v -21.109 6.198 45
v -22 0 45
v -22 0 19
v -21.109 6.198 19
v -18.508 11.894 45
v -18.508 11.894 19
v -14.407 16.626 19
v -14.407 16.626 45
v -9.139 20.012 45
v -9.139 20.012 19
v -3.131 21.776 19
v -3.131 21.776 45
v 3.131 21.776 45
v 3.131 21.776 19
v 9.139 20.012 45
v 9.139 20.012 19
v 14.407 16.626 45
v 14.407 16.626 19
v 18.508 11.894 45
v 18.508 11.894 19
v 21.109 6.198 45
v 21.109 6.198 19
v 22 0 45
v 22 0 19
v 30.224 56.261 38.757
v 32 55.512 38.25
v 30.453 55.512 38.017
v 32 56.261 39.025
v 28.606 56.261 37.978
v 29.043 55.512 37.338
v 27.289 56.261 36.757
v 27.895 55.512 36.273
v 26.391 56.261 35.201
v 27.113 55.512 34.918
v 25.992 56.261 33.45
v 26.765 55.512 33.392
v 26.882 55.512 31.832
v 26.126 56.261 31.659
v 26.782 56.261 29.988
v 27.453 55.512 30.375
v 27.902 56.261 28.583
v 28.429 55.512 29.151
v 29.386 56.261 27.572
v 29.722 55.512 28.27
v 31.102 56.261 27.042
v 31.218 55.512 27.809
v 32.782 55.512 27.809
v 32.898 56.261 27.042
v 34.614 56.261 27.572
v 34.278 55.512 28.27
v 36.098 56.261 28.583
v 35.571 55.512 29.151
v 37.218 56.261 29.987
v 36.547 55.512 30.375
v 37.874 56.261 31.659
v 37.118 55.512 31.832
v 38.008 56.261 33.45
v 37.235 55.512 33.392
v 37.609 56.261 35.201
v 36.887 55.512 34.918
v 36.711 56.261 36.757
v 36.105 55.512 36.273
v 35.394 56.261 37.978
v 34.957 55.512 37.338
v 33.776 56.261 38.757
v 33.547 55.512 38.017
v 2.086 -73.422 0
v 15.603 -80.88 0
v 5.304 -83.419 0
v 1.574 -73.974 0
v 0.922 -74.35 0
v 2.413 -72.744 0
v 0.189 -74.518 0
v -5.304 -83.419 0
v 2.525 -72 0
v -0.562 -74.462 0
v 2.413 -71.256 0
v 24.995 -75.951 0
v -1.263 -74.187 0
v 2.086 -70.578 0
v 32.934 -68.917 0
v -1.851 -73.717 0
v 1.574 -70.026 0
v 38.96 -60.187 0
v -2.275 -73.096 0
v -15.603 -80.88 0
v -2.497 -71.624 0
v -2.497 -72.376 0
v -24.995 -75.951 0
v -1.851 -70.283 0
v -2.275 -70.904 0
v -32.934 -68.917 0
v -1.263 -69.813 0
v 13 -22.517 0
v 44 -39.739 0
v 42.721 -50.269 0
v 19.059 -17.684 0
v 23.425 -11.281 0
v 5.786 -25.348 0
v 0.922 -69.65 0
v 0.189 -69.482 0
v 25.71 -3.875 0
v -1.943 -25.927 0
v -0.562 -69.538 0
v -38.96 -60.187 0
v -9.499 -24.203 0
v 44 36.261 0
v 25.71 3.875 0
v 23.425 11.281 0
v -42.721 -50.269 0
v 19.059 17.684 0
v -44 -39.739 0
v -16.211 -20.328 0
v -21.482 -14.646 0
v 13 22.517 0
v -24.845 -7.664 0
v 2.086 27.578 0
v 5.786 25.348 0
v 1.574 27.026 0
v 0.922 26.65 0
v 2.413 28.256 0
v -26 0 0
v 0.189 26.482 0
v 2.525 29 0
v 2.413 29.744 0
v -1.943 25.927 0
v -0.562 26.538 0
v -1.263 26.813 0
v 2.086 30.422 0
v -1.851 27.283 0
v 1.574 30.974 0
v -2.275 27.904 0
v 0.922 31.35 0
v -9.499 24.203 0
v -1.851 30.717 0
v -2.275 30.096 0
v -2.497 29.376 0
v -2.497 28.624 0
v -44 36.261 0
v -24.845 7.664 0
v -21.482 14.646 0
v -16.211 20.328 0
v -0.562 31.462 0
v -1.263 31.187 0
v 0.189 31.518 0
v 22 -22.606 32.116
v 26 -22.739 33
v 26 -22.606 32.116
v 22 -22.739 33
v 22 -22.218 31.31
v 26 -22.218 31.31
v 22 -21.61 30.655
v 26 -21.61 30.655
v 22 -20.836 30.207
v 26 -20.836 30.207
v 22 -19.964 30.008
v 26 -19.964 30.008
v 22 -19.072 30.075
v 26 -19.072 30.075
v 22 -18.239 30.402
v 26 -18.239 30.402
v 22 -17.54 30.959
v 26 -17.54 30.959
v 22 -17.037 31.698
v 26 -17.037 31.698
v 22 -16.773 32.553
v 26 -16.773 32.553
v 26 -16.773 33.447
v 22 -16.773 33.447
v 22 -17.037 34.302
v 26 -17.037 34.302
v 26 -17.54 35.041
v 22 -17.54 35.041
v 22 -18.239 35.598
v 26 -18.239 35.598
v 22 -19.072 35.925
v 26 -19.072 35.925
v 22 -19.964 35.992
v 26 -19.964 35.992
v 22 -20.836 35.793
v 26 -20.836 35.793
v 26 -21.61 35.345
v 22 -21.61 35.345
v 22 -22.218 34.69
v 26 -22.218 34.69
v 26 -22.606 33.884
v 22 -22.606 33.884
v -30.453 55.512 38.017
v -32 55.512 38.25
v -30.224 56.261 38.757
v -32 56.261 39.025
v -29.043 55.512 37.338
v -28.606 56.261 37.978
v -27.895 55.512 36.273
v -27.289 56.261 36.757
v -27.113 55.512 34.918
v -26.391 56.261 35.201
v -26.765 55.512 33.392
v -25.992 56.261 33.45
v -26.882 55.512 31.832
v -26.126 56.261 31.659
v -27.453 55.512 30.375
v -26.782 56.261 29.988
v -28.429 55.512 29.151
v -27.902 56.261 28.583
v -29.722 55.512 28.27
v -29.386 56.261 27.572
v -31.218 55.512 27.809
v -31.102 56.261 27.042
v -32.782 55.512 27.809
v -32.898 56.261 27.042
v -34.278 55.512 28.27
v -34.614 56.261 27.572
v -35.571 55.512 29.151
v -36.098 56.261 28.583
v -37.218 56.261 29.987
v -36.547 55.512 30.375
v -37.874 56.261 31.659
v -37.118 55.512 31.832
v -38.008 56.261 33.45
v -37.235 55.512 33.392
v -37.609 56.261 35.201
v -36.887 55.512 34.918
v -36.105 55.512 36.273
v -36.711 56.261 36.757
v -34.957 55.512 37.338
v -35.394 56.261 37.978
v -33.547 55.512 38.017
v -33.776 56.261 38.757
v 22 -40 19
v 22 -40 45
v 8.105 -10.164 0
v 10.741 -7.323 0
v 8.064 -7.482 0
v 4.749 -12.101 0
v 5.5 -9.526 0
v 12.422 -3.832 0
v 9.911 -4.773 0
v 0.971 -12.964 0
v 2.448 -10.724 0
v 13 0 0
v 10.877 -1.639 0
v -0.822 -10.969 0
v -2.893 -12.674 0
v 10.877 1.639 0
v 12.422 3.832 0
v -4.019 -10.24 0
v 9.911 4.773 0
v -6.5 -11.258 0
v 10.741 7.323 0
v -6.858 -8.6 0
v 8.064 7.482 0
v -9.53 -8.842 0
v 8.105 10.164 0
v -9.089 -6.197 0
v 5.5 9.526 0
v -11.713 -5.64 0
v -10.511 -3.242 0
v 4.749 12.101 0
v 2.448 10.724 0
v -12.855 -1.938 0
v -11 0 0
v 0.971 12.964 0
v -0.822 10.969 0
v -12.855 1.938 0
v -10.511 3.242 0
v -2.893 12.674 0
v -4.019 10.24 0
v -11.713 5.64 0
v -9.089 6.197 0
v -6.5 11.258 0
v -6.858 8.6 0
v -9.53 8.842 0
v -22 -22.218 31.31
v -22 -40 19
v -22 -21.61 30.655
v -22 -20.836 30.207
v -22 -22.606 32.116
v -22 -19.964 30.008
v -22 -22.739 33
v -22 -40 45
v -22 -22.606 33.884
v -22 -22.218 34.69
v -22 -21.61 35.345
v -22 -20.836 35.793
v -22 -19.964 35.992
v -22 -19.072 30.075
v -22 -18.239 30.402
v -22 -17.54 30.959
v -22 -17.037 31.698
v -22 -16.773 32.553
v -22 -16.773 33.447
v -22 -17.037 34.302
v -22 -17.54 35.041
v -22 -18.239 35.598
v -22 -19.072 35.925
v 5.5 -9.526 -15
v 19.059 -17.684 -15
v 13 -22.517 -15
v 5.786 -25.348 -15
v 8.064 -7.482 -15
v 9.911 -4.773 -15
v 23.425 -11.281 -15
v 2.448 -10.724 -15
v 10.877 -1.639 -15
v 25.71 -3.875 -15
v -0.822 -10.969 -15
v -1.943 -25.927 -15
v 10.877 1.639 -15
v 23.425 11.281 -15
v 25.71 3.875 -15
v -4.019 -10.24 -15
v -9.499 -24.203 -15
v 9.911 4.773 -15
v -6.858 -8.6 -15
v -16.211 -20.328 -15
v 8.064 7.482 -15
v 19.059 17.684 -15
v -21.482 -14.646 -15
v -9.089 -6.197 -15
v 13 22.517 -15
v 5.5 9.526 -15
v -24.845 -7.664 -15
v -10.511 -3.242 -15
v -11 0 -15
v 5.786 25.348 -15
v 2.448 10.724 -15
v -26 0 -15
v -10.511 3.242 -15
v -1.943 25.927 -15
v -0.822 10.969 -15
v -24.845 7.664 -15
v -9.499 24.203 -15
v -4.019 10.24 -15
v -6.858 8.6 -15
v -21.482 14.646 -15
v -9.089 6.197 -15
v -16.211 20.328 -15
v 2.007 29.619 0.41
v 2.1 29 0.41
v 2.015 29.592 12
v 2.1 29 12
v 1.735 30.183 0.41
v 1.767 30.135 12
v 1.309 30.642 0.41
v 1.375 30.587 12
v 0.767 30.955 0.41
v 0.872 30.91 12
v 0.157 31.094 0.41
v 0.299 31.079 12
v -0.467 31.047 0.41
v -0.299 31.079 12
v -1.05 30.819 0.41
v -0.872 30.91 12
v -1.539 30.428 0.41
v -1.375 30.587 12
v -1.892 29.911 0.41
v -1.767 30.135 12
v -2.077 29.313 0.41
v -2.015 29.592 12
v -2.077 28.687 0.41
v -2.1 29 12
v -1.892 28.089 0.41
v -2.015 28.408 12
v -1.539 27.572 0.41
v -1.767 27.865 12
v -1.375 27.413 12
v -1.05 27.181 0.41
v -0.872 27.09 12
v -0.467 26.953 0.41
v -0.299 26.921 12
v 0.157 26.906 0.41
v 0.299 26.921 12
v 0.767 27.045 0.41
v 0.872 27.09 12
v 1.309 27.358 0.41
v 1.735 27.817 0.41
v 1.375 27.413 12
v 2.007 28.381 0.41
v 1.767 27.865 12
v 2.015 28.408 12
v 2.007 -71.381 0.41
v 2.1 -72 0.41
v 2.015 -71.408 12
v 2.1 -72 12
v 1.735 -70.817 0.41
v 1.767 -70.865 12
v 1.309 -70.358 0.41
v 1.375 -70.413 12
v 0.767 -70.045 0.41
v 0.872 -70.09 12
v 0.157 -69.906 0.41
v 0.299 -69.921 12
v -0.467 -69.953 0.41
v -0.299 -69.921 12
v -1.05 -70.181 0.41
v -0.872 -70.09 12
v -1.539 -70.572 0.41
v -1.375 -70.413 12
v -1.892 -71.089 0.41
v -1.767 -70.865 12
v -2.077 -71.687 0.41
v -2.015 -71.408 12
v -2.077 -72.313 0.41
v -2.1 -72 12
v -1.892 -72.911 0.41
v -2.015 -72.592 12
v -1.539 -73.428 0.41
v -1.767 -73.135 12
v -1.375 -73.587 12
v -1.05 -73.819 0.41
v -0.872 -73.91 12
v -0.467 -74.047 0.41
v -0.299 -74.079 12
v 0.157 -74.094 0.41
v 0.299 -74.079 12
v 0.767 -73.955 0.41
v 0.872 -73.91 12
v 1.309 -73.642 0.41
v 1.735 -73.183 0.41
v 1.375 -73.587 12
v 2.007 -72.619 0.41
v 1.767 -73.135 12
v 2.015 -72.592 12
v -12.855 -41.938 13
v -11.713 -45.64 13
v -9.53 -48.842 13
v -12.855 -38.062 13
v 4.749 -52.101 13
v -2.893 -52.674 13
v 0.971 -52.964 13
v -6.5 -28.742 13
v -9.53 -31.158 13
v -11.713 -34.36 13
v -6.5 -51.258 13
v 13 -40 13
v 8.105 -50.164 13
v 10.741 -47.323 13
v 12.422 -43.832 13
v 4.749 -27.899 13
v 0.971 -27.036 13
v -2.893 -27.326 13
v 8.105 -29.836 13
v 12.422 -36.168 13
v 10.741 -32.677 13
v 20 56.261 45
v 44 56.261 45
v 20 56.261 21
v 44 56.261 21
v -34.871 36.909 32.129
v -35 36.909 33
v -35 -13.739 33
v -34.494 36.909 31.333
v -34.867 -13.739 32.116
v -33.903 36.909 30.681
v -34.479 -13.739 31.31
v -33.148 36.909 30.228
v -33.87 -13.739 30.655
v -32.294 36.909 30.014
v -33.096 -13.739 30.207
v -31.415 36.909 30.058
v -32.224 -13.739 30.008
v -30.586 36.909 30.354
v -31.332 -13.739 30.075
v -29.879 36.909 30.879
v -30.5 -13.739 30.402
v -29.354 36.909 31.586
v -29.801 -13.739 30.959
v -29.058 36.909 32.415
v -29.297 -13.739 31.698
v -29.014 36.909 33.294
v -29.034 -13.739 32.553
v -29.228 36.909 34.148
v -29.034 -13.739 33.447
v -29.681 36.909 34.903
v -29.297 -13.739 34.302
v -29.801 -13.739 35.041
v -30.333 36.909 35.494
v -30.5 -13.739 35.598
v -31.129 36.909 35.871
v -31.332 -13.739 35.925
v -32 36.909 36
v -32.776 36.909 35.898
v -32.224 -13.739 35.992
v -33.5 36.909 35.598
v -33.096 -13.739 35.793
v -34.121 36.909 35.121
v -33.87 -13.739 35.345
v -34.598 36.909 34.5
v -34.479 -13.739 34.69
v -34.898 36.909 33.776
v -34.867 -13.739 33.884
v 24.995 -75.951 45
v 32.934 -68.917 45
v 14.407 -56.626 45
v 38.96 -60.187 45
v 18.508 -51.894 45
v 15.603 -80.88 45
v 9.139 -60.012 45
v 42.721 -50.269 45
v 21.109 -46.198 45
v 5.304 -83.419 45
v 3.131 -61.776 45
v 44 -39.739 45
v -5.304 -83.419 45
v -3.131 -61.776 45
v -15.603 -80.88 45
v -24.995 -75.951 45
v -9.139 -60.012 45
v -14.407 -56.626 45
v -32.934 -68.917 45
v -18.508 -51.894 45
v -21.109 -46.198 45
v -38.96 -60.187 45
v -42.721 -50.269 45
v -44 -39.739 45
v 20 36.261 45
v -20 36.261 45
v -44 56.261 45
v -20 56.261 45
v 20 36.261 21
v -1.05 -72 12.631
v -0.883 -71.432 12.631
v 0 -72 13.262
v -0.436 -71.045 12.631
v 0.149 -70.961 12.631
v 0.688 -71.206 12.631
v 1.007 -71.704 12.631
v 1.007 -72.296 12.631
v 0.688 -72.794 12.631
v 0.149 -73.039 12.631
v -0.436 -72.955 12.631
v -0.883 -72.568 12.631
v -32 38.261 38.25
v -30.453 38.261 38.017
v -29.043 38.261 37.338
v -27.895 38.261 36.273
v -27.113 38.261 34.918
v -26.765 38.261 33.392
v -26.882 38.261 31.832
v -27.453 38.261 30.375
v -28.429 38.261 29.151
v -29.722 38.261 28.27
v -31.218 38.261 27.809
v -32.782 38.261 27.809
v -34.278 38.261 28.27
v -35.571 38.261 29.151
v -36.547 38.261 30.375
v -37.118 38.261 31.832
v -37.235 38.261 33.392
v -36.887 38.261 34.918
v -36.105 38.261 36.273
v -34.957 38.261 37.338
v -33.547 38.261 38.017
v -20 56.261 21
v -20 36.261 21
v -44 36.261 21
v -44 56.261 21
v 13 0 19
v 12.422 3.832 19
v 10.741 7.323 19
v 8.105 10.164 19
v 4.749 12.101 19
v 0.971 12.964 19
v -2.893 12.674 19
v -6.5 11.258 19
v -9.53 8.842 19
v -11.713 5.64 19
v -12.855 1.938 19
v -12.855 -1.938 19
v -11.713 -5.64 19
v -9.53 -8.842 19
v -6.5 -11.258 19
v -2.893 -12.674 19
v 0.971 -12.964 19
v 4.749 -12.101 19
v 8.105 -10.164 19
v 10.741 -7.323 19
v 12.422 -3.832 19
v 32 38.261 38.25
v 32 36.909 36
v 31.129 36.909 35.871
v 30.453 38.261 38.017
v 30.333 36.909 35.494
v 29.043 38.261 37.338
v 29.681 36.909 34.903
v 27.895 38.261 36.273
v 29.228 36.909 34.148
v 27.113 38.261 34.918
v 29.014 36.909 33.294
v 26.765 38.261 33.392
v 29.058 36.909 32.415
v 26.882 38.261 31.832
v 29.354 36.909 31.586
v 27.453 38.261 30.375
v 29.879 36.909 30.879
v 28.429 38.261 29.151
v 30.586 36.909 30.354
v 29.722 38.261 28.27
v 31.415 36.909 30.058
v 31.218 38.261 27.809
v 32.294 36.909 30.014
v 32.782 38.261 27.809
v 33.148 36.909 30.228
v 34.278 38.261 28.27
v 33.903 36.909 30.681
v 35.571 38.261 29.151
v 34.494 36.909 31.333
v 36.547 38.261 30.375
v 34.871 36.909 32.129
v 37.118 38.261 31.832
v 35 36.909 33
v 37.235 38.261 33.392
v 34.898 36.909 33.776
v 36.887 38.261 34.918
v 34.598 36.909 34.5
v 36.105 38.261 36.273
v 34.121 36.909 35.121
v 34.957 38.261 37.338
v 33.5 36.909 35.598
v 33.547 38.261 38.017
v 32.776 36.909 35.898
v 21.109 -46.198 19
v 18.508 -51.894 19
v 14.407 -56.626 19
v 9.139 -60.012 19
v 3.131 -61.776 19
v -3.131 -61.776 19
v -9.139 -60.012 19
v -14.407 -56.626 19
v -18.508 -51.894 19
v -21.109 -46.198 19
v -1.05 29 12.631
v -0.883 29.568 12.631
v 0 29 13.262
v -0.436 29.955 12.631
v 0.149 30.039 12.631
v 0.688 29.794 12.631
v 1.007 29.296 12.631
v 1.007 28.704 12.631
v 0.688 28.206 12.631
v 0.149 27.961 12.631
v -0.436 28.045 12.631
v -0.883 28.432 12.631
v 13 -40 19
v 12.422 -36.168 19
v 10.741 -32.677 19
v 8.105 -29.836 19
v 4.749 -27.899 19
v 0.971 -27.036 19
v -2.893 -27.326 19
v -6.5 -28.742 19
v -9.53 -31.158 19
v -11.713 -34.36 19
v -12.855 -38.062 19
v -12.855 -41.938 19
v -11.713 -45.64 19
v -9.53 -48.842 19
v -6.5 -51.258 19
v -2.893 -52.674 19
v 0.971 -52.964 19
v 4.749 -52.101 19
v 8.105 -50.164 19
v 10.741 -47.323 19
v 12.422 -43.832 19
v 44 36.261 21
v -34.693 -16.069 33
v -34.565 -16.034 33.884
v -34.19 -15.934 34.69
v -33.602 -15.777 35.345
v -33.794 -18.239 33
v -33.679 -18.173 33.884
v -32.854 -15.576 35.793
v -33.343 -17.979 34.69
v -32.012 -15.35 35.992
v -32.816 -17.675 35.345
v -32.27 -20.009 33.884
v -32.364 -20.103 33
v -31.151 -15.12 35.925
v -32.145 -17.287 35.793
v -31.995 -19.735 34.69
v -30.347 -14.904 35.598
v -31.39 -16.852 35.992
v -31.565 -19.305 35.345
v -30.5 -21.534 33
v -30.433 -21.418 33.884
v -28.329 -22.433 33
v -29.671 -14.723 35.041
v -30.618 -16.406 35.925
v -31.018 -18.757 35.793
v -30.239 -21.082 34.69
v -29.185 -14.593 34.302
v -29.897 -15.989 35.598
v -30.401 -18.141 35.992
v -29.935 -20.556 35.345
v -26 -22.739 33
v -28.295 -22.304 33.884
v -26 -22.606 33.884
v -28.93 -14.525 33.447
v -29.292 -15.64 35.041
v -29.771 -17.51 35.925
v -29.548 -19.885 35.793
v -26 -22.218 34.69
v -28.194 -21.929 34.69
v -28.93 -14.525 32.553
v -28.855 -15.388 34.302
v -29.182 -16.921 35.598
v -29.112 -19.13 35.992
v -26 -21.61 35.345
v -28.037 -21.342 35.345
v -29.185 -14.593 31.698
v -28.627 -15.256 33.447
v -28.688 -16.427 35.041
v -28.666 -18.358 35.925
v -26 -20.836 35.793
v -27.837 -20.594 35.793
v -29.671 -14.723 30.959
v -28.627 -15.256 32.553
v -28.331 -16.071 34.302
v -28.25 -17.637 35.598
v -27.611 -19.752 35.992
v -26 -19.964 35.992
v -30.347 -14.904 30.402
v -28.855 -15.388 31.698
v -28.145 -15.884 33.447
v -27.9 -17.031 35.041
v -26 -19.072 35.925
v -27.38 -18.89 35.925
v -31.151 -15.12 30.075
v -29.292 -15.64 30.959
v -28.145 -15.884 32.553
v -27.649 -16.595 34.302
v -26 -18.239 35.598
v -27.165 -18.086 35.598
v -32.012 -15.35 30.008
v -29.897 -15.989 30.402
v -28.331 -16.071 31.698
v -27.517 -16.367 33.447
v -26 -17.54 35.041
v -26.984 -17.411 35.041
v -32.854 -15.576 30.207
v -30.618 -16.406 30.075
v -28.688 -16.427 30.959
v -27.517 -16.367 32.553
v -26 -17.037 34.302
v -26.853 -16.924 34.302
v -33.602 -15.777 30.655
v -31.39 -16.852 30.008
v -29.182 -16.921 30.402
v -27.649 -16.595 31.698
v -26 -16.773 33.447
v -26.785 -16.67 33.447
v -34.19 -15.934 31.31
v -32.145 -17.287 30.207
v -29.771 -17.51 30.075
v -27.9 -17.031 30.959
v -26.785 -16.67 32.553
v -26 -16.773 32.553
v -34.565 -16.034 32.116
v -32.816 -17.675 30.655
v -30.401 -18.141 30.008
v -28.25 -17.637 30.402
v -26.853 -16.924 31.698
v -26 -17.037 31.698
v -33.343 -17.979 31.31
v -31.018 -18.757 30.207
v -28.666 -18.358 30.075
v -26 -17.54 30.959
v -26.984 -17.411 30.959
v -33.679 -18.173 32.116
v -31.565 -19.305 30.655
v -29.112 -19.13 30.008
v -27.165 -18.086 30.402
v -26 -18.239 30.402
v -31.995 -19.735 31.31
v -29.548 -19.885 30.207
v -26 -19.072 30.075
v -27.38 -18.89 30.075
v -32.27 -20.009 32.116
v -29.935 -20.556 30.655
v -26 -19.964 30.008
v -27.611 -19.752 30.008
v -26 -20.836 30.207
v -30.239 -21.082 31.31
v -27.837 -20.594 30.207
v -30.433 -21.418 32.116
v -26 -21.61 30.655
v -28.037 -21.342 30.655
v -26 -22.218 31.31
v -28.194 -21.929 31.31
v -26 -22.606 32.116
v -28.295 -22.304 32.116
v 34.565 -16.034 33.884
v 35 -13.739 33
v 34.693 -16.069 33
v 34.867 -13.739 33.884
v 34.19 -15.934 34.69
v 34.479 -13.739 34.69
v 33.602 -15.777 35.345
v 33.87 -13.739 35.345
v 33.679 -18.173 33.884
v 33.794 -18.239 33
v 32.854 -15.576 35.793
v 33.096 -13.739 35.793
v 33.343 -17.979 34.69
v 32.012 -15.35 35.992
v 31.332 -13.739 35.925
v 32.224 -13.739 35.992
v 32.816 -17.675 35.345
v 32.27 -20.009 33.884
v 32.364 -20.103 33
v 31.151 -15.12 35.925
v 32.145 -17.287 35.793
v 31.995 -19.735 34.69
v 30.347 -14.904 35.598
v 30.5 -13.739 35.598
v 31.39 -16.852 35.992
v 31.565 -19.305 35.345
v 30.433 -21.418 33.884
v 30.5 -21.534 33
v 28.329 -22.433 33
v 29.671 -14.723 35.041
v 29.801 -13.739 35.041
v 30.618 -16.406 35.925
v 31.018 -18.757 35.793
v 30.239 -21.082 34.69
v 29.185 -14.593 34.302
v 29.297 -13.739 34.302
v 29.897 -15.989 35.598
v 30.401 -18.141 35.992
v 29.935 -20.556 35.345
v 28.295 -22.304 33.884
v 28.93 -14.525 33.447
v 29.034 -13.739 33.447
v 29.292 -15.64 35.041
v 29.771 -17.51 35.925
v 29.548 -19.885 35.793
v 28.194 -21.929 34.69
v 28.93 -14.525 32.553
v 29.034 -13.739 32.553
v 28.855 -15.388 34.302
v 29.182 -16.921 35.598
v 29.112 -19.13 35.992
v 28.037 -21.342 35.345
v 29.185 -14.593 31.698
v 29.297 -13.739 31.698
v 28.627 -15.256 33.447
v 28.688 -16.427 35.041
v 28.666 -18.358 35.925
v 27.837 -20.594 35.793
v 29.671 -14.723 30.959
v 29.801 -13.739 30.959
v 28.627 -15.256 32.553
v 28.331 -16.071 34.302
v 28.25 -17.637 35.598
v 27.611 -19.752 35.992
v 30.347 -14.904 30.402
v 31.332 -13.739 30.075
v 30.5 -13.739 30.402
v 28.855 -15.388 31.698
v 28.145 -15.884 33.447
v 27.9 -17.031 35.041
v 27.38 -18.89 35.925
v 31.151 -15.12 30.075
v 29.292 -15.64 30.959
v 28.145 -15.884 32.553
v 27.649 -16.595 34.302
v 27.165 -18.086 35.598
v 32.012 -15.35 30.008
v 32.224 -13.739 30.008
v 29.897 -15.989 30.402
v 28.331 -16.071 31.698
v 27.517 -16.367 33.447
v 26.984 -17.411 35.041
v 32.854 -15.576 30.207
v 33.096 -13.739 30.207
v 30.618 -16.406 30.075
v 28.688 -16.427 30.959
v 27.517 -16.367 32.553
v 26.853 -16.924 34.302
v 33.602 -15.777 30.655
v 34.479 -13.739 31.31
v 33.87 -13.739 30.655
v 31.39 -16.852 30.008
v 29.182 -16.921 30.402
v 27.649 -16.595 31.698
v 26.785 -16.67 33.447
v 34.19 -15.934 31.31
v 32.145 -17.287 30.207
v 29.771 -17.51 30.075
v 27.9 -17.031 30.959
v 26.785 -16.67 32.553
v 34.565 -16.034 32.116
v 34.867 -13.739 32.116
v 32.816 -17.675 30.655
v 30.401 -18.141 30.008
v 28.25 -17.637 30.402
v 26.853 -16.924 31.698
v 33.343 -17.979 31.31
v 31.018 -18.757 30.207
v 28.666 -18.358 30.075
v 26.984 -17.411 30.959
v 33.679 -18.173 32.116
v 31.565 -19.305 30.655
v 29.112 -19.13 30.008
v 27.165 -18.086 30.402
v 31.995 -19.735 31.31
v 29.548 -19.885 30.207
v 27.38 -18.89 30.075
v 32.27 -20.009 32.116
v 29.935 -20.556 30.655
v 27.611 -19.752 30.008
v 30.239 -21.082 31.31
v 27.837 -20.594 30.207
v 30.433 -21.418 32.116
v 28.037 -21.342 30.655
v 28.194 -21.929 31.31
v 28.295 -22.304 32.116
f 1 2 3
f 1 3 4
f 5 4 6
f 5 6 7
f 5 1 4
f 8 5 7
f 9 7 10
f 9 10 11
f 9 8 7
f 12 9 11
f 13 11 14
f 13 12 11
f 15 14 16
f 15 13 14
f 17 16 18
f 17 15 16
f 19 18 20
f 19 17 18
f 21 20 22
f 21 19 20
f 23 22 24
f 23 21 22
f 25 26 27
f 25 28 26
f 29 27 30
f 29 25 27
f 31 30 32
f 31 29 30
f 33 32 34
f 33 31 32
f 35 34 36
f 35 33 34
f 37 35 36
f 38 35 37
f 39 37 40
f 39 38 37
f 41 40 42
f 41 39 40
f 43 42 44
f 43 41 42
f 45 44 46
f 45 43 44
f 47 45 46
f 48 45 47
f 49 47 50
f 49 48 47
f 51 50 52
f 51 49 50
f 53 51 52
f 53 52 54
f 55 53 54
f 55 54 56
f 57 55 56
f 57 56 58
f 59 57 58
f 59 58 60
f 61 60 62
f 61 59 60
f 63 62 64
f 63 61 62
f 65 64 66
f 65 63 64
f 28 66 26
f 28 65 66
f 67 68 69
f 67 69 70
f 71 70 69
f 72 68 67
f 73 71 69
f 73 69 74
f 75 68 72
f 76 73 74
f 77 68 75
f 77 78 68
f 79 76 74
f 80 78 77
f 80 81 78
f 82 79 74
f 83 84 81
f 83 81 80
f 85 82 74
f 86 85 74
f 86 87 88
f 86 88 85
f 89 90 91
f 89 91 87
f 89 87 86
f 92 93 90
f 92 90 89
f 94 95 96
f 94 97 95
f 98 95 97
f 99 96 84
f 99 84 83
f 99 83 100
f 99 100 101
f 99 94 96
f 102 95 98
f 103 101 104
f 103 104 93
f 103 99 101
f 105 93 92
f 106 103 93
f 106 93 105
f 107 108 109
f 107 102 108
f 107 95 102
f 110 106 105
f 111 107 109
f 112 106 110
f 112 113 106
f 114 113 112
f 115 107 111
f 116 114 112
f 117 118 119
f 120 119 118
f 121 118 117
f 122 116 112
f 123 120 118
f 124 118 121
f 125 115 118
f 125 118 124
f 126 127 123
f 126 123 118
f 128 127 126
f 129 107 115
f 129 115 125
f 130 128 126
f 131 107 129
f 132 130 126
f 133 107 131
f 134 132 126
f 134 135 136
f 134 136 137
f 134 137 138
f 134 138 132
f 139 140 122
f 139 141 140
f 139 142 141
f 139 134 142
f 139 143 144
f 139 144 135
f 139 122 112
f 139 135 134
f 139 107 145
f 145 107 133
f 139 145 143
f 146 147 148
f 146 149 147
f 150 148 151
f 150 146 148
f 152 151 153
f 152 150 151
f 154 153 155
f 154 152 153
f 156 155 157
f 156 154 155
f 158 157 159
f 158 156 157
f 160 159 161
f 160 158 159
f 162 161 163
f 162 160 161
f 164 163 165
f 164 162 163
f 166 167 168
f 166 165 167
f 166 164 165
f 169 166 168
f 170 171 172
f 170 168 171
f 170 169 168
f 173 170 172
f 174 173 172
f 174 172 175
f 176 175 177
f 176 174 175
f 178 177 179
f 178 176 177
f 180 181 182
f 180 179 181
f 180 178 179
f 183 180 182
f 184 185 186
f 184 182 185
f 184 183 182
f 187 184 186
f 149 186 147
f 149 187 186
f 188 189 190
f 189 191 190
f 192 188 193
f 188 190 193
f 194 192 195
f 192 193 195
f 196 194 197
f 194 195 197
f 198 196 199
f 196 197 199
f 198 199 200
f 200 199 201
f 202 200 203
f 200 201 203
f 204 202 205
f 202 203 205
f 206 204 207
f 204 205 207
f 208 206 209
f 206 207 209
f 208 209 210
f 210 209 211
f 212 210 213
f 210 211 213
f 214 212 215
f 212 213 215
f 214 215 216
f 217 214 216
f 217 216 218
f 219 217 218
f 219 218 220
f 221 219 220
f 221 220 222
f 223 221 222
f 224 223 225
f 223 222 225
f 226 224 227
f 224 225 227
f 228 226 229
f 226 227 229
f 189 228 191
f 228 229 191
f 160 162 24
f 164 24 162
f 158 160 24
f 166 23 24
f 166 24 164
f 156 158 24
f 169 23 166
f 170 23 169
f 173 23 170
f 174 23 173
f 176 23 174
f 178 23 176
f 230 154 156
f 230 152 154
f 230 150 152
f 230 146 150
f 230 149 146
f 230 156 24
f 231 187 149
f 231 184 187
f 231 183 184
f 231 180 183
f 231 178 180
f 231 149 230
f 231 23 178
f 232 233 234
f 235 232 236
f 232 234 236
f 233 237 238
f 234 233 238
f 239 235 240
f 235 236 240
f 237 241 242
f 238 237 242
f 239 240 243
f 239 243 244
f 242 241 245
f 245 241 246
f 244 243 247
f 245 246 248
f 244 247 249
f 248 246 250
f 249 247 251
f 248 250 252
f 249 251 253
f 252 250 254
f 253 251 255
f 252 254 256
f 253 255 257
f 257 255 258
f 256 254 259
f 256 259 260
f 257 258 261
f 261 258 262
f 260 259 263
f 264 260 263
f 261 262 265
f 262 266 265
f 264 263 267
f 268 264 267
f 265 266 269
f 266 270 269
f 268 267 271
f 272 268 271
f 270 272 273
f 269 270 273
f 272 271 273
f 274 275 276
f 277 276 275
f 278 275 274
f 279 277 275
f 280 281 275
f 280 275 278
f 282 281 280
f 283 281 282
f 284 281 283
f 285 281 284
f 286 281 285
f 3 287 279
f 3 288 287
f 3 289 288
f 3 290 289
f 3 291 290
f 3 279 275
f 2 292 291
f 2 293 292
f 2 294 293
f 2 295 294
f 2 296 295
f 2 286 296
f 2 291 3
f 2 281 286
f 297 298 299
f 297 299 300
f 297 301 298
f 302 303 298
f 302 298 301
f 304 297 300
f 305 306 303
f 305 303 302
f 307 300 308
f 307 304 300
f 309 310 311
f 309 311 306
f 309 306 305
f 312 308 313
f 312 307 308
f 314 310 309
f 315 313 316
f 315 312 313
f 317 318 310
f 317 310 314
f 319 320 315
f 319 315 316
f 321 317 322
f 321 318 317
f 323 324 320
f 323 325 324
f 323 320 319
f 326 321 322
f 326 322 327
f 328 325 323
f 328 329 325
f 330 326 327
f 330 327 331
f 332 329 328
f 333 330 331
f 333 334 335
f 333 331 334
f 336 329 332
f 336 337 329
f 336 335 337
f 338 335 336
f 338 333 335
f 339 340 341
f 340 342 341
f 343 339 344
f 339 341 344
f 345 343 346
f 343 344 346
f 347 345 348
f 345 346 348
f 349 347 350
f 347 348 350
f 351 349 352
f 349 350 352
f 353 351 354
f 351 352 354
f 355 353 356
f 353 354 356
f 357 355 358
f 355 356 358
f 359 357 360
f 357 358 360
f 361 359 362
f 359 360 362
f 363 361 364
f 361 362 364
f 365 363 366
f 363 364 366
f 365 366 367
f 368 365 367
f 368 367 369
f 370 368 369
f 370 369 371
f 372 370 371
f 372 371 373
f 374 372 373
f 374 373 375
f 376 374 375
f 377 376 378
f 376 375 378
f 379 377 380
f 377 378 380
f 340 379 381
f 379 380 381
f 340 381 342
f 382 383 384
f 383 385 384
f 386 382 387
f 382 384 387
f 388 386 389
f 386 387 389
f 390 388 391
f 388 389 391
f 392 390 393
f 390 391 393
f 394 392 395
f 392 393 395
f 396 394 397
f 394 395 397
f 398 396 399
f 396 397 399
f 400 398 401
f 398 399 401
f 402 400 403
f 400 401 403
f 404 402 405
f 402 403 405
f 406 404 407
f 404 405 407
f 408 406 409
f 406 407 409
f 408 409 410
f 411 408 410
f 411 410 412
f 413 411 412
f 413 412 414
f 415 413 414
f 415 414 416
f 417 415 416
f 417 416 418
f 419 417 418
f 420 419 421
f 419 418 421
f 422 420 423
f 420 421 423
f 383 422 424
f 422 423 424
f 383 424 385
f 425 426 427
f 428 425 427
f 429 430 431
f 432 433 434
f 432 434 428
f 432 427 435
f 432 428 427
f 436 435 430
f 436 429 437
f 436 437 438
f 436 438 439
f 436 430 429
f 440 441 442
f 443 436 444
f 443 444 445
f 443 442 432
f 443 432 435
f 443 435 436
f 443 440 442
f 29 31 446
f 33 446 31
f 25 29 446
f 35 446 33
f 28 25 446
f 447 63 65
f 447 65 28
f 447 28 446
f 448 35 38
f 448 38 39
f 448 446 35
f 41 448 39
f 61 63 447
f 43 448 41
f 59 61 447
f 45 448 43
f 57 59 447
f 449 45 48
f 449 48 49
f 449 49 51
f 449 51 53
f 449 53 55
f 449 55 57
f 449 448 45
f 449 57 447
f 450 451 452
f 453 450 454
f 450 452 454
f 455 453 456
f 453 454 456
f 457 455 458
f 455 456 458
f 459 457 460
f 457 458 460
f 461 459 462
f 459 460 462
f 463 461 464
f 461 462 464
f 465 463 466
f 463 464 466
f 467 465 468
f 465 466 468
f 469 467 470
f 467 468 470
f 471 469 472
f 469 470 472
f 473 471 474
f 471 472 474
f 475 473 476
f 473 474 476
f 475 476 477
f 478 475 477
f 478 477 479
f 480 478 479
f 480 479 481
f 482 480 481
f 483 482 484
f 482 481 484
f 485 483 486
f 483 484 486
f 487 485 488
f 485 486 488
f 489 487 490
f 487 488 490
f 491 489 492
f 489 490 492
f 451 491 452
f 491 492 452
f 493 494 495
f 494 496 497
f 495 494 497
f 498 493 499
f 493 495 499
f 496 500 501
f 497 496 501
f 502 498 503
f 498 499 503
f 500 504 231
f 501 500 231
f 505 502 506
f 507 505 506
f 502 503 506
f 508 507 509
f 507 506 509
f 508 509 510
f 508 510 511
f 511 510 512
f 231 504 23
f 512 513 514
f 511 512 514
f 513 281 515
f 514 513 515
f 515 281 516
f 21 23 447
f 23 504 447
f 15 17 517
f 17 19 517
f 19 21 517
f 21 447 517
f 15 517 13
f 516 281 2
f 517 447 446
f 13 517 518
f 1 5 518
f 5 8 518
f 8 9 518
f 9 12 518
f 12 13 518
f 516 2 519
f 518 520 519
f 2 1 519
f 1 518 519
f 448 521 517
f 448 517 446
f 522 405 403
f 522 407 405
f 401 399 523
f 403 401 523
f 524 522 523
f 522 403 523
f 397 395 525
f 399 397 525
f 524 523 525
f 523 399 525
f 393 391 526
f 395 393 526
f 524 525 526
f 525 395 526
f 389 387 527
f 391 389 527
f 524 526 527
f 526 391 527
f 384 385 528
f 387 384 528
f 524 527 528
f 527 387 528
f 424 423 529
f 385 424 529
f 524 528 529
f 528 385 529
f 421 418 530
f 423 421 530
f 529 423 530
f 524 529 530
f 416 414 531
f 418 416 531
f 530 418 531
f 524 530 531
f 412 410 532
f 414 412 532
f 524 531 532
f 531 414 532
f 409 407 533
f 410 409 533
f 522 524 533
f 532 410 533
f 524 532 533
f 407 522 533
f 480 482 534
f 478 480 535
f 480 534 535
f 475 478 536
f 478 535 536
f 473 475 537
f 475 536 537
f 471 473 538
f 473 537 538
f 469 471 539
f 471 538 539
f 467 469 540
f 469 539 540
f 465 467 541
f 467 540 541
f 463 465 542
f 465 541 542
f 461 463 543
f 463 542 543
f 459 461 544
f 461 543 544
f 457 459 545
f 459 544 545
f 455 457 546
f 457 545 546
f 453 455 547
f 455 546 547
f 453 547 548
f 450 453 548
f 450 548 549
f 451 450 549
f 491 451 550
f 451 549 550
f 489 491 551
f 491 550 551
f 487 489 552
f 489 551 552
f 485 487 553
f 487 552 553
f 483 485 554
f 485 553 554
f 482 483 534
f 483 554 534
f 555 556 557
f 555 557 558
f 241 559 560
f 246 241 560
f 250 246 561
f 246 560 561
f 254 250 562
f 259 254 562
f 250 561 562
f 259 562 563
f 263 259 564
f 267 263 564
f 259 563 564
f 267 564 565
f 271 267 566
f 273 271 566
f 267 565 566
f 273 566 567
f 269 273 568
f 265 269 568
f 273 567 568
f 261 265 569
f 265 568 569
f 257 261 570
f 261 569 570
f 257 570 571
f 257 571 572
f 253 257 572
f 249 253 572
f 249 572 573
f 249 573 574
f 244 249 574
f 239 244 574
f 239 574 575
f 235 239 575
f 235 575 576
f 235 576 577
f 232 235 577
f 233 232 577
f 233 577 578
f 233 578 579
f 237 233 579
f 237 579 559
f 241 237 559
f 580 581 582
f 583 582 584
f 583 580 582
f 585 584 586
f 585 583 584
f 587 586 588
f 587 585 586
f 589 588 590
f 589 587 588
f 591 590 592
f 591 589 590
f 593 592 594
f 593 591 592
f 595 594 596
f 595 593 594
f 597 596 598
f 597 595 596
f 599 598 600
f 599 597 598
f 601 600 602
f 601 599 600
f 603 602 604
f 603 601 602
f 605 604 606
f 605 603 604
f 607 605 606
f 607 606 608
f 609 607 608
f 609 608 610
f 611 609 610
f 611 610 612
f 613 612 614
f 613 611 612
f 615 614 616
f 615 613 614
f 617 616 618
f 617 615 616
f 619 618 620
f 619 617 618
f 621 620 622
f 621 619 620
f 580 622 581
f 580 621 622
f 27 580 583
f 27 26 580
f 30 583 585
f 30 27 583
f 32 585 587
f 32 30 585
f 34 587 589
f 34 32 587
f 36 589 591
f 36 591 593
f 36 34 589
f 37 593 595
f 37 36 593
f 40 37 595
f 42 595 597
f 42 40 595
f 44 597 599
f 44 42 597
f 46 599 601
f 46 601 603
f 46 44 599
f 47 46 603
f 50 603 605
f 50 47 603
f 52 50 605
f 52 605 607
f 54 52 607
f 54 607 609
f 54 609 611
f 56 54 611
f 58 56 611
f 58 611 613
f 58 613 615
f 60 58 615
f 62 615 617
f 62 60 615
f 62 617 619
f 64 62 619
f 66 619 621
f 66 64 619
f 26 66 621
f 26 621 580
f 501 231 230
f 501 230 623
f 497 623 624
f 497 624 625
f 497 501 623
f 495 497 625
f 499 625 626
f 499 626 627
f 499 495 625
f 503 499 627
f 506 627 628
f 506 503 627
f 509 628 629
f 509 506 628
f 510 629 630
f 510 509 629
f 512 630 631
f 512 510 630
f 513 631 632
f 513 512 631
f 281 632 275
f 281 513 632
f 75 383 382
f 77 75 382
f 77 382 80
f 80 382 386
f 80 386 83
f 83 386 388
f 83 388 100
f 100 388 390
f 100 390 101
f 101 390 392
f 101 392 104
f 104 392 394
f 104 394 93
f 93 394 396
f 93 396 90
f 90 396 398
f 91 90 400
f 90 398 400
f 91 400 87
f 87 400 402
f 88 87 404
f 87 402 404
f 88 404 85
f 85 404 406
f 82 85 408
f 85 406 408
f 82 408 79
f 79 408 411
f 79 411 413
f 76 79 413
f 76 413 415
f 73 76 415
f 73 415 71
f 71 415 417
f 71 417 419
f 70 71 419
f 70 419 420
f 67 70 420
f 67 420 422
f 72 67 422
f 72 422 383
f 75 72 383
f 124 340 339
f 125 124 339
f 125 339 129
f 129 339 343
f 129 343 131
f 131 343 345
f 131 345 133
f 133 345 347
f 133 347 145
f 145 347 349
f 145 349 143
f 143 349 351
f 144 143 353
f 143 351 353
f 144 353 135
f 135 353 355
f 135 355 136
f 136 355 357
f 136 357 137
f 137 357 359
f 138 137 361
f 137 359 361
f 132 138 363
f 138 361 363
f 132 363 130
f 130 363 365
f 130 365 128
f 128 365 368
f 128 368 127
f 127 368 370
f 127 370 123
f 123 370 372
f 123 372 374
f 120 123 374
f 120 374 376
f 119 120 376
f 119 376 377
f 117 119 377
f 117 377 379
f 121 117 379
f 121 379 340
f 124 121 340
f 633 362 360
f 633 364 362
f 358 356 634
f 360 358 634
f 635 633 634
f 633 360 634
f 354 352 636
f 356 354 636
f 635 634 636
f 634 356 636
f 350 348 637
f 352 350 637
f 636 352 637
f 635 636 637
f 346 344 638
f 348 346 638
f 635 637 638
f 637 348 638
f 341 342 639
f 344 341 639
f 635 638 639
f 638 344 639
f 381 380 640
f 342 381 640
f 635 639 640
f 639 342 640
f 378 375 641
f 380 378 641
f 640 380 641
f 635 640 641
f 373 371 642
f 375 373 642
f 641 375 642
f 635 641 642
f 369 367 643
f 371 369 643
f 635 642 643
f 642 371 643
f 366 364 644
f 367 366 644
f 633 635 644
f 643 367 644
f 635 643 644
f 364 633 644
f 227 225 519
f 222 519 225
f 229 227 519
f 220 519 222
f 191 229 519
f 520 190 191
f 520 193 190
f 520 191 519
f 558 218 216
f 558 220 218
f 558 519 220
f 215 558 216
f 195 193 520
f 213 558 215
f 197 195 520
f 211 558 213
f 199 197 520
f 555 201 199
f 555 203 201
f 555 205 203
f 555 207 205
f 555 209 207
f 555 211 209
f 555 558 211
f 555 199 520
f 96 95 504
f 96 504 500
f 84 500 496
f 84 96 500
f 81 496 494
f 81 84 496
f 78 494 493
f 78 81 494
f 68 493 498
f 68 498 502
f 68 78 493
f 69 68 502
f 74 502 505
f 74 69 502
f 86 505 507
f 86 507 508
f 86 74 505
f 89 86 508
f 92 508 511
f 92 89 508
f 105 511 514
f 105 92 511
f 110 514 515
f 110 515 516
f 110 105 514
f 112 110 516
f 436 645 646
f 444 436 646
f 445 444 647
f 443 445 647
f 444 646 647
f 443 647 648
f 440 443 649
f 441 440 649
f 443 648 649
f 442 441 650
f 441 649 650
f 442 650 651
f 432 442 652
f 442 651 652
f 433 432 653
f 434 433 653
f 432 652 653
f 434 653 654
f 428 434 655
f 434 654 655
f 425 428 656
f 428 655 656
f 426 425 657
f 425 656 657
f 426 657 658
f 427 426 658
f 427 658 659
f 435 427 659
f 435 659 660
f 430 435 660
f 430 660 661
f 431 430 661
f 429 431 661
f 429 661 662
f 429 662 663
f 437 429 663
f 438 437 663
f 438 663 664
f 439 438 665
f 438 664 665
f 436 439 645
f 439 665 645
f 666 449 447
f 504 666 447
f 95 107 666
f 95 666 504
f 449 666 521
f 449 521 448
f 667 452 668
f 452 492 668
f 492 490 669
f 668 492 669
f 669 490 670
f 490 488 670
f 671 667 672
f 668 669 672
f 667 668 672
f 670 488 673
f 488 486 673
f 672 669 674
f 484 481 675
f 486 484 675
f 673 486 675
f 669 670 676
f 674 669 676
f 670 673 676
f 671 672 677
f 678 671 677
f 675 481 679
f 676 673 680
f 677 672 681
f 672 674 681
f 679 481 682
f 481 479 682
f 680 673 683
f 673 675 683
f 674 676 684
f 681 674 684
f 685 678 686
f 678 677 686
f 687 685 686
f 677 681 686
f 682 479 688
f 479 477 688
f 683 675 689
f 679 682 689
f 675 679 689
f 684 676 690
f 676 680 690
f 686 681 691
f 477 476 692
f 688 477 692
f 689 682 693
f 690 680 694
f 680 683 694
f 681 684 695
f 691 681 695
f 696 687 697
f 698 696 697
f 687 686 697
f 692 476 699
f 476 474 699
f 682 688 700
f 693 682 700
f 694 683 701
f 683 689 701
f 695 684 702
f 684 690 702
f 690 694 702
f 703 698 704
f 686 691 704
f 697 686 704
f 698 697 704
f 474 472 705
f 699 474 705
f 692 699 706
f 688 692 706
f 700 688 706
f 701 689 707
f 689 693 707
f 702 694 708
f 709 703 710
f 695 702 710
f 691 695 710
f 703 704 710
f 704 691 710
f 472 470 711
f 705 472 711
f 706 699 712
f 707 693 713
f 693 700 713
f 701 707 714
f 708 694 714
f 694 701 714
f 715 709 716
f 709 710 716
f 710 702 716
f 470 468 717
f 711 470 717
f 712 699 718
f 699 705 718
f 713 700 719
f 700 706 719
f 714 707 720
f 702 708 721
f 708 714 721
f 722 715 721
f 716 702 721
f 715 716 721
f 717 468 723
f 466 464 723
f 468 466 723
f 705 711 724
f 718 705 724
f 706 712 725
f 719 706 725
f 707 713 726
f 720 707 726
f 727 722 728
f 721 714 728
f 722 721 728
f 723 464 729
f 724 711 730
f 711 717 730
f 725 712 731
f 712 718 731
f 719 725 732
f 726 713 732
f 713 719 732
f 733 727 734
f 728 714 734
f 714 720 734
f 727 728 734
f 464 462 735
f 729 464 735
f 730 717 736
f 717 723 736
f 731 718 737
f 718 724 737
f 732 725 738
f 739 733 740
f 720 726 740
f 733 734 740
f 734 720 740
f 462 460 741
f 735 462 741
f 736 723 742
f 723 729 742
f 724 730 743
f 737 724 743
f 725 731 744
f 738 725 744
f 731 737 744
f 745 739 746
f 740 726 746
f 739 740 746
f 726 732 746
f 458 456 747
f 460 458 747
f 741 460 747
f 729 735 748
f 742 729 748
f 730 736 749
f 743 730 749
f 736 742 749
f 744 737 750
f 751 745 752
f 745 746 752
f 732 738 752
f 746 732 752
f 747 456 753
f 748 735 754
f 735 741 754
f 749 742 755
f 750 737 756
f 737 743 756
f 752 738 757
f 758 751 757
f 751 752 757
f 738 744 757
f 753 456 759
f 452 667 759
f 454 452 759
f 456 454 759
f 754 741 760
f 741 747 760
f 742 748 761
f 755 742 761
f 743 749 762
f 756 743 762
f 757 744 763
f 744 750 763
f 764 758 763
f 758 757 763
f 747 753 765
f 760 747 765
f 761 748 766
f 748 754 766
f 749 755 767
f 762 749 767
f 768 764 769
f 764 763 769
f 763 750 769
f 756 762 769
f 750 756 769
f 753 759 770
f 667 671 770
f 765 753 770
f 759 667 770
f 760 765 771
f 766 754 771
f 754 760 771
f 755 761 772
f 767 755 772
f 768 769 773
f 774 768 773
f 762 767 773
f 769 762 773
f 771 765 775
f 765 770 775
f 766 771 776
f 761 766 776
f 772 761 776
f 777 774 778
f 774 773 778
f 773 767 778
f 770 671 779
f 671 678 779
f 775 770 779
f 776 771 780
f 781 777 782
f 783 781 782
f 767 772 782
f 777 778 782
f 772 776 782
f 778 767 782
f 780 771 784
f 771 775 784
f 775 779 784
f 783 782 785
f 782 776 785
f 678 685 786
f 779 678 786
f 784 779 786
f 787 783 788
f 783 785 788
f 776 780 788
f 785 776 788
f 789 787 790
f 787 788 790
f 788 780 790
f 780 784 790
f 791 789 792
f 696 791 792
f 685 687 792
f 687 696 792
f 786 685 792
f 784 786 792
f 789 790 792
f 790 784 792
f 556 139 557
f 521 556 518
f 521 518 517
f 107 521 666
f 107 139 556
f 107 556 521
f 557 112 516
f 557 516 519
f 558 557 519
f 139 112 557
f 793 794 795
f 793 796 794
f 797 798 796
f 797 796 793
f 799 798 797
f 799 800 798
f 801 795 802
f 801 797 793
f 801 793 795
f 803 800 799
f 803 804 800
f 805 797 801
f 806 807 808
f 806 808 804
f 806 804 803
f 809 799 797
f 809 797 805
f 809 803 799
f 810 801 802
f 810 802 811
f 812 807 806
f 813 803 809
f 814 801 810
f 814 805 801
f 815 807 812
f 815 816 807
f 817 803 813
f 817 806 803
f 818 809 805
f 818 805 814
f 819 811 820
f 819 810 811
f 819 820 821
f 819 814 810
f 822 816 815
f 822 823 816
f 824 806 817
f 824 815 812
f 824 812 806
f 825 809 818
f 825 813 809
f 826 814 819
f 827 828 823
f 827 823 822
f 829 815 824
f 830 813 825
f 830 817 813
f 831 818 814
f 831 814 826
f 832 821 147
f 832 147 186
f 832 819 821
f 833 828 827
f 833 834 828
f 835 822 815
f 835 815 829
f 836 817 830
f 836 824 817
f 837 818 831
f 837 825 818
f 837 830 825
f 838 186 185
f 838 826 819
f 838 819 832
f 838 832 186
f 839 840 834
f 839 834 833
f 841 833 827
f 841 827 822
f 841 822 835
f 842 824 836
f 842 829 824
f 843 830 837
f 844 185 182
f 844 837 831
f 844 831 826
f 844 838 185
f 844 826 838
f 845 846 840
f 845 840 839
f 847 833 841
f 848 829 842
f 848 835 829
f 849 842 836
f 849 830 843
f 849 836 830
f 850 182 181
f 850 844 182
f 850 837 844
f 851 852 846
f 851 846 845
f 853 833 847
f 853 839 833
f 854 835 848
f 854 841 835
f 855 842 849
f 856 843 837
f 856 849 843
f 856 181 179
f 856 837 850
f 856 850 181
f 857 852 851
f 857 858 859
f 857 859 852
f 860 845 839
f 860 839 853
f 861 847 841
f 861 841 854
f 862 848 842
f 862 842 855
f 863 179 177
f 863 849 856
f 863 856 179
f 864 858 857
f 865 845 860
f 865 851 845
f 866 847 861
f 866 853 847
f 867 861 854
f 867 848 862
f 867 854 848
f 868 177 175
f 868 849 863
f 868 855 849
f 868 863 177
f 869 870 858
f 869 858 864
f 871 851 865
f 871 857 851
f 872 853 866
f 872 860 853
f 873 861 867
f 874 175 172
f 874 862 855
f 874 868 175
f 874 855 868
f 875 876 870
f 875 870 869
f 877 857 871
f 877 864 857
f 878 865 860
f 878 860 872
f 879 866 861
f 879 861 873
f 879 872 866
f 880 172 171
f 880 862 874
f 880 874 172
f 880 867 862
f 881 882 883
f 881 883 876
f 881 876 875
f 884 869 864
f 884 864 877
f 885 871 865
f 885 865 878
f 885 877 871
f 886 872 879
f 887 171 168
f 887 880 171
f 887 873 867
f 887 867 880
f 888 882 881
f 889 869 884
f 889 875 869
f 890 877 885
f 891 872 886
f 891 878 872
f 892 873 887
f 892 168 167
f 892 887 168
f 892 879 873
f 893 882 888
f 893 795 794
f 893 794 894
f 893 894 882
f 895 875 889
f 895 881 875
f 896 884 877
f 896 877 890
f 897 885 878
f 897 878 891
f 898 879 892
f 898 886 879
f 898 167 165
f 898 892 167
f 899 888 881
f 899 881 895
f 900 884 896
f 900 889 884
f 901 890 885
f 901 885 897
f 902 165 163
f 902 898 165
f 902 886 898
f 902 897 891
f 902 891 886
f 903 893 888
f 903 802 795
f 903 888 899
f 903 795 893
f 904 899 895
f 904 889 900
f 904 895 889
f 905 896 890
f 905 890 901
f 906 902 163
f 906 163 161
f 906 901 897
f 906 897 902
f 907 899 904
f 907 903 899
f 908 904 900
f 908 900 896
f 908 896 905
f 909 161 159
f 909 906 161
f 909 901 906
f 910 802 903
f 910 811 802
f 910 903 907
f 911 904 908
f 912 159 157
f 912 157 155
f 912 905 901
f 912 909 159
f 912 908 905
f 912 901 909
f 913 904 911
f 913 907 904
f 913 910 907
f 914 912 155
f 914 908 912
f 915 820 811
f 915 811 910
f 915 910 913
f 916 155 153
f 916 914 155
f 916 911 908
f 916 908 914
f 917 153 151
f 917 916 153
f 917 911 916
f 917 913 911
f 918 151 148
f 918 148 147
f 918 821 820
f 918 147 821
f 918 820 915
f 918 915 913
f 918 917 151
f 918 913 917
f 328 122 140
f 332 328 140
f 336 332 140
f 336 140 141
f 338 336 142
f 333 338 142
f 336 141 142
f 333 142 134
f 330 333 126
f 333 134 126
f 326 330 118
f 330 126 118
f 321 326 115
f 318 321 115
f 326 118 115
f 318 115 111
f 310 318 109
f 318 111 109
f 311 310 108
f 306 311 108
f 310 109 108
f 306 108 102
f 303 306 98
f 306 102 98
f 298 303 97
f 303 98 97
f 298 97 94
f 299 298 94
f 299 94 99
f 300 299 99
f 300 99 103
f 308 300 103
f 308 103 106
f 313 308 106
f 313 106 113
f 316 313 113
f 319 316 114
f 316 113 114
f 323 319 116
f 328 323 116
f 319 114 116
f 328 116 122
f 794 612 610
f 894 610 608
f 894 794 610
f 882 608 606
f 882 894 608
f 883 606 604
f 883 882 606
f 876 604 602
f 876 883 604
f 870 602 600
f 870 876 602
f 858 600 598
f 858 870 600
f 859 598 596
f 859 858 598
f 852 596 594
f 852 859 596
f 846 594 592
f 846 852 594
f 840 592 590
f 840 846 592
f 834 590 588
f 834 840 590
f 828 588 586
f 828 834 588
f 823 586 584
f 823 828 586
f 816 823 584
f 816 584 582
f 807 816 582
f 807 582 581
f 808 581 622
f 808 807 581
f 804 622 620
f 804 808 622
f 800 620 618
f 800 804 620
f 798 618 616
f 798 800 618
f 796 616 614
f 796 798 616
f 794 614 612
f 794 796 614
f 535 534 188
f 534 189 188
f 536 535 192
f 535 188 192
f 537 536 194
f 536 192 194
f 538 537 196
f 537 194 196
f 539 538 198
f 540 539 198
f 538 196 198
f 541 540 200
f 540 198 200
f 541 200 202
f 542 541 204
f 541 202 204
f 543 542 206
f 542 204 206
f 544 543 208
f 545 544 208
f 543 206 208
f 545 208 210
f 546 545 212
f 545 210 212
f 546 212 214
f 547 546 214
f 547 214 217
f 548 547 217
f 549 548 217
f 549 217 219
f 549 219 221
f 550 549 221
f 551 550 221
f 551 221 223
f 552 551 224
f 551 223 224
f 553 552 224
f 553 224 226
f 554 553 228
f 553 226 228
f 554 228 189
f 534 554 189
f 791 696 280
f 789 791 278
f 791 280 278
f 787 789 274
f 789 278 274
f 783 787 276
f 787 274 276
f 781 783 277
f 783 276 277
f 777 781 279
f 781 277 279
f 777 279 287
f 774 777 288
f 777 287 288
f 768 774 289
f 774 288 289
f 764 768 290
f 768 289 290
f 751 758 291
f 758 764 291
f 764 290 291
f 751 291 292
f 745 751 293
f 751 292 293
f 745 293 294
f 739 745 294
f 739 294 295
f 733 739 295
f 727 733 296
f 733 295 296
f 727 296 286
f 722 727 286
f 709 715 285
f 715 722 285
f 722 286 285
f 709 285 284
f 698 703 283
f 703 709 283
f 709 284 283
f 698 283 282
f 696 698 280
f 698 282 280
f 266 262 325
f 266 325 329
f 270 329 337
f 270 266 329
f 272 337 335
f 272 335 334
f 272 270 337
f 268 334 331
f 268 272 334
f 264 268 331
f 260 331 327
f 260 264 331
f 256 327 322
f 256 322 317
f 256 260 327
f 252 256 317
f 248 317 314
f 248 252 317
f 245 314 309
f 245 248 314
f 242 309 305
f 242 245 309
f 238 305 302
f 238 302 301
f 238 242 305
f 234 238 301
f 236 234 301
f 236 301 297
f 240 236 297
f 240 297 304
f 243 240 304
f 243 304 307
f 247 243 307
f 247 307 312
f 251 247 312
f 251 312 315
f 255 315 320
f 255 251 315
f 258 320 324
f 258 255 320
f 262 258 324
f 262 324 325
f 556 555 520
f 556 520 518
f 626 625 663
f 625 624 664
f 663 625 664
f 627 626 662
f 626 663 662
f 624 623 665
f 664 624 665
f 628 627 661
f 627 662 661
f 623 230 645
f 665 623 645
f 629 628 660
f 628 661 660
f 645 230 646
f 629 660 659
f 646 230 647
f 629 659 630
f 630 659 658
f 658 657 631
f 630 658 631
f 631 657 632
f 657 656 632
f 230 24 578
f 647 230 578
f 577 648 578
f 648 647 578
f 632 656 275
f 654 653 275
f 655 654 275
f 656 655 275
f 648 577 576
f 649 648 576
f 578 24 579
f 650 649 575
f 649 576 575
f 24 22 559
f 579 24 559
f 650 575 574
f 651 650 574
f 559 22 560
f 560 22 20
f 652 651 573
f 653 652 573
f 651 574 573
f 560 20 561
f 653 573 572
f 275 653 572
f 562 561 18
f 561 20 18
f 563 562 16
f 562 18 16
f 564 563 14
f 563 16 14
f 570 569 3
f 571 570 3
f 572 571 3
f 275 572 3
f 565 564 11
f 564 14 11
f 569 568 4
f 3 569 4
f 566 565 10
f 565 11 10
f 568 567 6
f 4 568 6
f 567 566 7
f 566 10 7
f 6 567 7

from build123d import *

# Parameters (mm, degrees)
EXTRUDE_1_DEPTH              = 45
CUT_EXTRUDE_1_DEPTH          = 26
SKETCH_4_R                   = 13
CUT_EXTRUDE_2_DEPTH          = 99.1035198
SKETCH_5_R                   = 13
CUT_EXTRUDE_3_DEPTH          = 6
SKETCH_7_W                   = 45.202600284
SKETCH_7_H                   = 48.529850946
CUT_EXTRUDE_4_DEPTH          = 131.224040013
SKETCH_8_R                   = 26
SKETCH_8_R_2                 = 11
EXTRUDE_3_DEPTH              = 15
HOLE_WIZARD_M5_1_D           = 4.2
HOLE_WIZARD_M5_1_DEPTH       = 12
HOLE_WIZARD_M5_1_CSINK_D     = 5.05
HOLE_WIZARD_M5_1_CSINK_ANGLE = 92
HOLE_WIZARD_M5_1_TIP         = 1.2618073
SKETCH_17_R                  = 3


with BuildPart() as part:
    # 스케치1 → 보스-돌출1 (new body)
    with BuildSketch(Plane.XY):
        with BuildLine():
            Line((5.476321218, 36.260519483), (20, 36.260519483))
            Line((20, 36.260519483), (20, 56.260519483))
            Line((20, 56.260519483), (44, 56.260519483))
            Line((44, 56.260519483), (44, -39.739480517))
            ThreePointArc((44, -39.739480517), (0, -83.739480517), (-44, -39.739480517))
            Line((-44, -39.739480517), (-44, 56.260519483))
            Line((-44, 56.260519483), (-20, 56.260519483))
            Line((-20, 56.260519483), (-20, 36.260519483))
            Line((-20, 36.260519483), (5.476321218, 36.260519483))
        make_face()
    extrude(amount=EXTRUDE_1_DEPTH)

    # 스케치3 → 컷-돌출1 (cut)
    with BuildSketch(Plane.XY.offset(45)):
        with BuildLine():
            Line((22, 0), (22, -40))
            ThreePointArc((22, -40), (0, -62), (-22, -40))
            Line((-22, -40), (-22, 0))
            ThreePointArc((-22, 0), (0, 22), (22, 0))
        make_face()
    extrude(amount=-CUT_EXTRUDE_1_DEPTH, mode=Mode.SUBTRACT)

    # 스케치4 → 컷-돌출2 (cut, through all)
    with BuildSketch(Plane.XY.offset(19)):
        Circle(SKETCH_4_R)
    extrude(amount=-CUT_EXTRUDE_2_DEPTH, mode=Mode.SUBTRACT)

    # 스케치5 → 컷-돌출3 (cut)
    with BuildSketch(Plane.XY.offset(19)):
        with Locations((0, -40)):
            Circle(SKETCH_5_R)
    extrude(amount=-CUT_EXTRUDE_3_DEPTH, mode=Mode.SUBTRACT)

    # 스케치7 → 컷-돌출4 (cut, through all)
    with BuildSketch(Plane(origin=(45, 0, 0), x_dir=(0, 0, -1), z_dir=(1, 0, 0))):
        with Locations((1.601300142, 60.525444956)):
            Rectangle(SKETCH_7_W, SKETCH_7_H)
    extrude(amount=-CUT_EXTRUDE_4_DEPTH, mode=Mode.SUBTRACT)

    # 스케치8 → 보스-돌출3 (add)
    with BuildSketch(Plane(origin=(0, 0, 0), x_dir=(-1, 0, 0), z_dir=(0, 0, -1))):
        Circle(SKETCH_8_R)
        Circle(SKETCH_8_R_2, mode=Mode.SUBTRACT)
    extrude(amount=EXTRUDE_3_DEPTH)

    # 스케치13 → M12x1.5 나사 구멍3 (revolve, cut)
    with BuildSketch(Plane(origin=(32, 56.260519483, 33), x_dir=(0, 0, 1), z_dir=(1, 0, 0))):
        Polygon((0, 0), (0, 21.15451825), (5.25, 18), (5.25, 0.7484088), (6.025, 0), align=None)
    m12x1_5_3 = revolve(axis=Axis((32, 62.610519483, 33), (0, -1, 0)), mode=Mode.SUBTRACT)

    # 대칭 복사1: M12x1.5 나사 구멍3 across plane
    add(m12x1_5_3.mirror(Plane(origin=(0, 0, 0), x_dir=(0, 0, 1), z_dir=(1, 0, 0))), mode=Mode.SUBTRACT)

    # M5 나사 구멍1
    with Locations(Plane(origin=(0, 29, 0), x_dir=(-1, 0, 0), z_dir=(0, 0, -1))):
        with Locations((0, 0), (0, -101)):
            CounterSinkHole(HOLE_WIZARD_M5_1_D / 2, HOLE_WIZARD_M5_1_CSINK_D / 2, depth=HOLE_WIZARD_M5_1_DEPTH, counter_sink_angle=HOLE_WIZARD_M5_1_CSINK_ANGLE)
            with Locations((0, 0, -(HOLE_WIZARD_M5_1_DEPTH + HOLE_WIZARD_M5_1_TIP / 2))):  # 118° drill point
                Cone(0, HOLE_WIZARD_M5_1_D / 2, HOLE_WIZARD_M5_1_TIP, mode=Mode.SUBTRACT)

    # 컷-스윕1: sweep along a path in 스케치16
    with BuildLine(Plane.XY.offset(33)) as sweep_1_path:
        Line((-32, 56.260519483), (-32, -13.739480517))
        ThreePointArc((-32, -13.739480517), (-30.242640687, -17.982121204), (-26, -19.739480517))
        Line((-26, -19.739480517), (-16.926354954, -19.739480517))
    # 스케치17 → 컷-스윕1 (sweep, cut)
    with BuildSketch(Plane(origin=(-32, 56.260519483, 33), x_dir=(-1, 0, 0), z_dir=(0, -1, 0))):
        Circle(SKETCH_17_R)
    sweep_1 = sweep(path=sweep_1_path.line, mode=Mode.SUBTRACT)

    # 대칭 복사3: 컷-스윕1 across plane
    add(sweep_1.mirror(Plane(origin=(0, 0, 0), x_dir=(0, 0, 1), z_dir=(1, 0, 0))), mode=Mode.SUBTRACT)


solid = part.part
